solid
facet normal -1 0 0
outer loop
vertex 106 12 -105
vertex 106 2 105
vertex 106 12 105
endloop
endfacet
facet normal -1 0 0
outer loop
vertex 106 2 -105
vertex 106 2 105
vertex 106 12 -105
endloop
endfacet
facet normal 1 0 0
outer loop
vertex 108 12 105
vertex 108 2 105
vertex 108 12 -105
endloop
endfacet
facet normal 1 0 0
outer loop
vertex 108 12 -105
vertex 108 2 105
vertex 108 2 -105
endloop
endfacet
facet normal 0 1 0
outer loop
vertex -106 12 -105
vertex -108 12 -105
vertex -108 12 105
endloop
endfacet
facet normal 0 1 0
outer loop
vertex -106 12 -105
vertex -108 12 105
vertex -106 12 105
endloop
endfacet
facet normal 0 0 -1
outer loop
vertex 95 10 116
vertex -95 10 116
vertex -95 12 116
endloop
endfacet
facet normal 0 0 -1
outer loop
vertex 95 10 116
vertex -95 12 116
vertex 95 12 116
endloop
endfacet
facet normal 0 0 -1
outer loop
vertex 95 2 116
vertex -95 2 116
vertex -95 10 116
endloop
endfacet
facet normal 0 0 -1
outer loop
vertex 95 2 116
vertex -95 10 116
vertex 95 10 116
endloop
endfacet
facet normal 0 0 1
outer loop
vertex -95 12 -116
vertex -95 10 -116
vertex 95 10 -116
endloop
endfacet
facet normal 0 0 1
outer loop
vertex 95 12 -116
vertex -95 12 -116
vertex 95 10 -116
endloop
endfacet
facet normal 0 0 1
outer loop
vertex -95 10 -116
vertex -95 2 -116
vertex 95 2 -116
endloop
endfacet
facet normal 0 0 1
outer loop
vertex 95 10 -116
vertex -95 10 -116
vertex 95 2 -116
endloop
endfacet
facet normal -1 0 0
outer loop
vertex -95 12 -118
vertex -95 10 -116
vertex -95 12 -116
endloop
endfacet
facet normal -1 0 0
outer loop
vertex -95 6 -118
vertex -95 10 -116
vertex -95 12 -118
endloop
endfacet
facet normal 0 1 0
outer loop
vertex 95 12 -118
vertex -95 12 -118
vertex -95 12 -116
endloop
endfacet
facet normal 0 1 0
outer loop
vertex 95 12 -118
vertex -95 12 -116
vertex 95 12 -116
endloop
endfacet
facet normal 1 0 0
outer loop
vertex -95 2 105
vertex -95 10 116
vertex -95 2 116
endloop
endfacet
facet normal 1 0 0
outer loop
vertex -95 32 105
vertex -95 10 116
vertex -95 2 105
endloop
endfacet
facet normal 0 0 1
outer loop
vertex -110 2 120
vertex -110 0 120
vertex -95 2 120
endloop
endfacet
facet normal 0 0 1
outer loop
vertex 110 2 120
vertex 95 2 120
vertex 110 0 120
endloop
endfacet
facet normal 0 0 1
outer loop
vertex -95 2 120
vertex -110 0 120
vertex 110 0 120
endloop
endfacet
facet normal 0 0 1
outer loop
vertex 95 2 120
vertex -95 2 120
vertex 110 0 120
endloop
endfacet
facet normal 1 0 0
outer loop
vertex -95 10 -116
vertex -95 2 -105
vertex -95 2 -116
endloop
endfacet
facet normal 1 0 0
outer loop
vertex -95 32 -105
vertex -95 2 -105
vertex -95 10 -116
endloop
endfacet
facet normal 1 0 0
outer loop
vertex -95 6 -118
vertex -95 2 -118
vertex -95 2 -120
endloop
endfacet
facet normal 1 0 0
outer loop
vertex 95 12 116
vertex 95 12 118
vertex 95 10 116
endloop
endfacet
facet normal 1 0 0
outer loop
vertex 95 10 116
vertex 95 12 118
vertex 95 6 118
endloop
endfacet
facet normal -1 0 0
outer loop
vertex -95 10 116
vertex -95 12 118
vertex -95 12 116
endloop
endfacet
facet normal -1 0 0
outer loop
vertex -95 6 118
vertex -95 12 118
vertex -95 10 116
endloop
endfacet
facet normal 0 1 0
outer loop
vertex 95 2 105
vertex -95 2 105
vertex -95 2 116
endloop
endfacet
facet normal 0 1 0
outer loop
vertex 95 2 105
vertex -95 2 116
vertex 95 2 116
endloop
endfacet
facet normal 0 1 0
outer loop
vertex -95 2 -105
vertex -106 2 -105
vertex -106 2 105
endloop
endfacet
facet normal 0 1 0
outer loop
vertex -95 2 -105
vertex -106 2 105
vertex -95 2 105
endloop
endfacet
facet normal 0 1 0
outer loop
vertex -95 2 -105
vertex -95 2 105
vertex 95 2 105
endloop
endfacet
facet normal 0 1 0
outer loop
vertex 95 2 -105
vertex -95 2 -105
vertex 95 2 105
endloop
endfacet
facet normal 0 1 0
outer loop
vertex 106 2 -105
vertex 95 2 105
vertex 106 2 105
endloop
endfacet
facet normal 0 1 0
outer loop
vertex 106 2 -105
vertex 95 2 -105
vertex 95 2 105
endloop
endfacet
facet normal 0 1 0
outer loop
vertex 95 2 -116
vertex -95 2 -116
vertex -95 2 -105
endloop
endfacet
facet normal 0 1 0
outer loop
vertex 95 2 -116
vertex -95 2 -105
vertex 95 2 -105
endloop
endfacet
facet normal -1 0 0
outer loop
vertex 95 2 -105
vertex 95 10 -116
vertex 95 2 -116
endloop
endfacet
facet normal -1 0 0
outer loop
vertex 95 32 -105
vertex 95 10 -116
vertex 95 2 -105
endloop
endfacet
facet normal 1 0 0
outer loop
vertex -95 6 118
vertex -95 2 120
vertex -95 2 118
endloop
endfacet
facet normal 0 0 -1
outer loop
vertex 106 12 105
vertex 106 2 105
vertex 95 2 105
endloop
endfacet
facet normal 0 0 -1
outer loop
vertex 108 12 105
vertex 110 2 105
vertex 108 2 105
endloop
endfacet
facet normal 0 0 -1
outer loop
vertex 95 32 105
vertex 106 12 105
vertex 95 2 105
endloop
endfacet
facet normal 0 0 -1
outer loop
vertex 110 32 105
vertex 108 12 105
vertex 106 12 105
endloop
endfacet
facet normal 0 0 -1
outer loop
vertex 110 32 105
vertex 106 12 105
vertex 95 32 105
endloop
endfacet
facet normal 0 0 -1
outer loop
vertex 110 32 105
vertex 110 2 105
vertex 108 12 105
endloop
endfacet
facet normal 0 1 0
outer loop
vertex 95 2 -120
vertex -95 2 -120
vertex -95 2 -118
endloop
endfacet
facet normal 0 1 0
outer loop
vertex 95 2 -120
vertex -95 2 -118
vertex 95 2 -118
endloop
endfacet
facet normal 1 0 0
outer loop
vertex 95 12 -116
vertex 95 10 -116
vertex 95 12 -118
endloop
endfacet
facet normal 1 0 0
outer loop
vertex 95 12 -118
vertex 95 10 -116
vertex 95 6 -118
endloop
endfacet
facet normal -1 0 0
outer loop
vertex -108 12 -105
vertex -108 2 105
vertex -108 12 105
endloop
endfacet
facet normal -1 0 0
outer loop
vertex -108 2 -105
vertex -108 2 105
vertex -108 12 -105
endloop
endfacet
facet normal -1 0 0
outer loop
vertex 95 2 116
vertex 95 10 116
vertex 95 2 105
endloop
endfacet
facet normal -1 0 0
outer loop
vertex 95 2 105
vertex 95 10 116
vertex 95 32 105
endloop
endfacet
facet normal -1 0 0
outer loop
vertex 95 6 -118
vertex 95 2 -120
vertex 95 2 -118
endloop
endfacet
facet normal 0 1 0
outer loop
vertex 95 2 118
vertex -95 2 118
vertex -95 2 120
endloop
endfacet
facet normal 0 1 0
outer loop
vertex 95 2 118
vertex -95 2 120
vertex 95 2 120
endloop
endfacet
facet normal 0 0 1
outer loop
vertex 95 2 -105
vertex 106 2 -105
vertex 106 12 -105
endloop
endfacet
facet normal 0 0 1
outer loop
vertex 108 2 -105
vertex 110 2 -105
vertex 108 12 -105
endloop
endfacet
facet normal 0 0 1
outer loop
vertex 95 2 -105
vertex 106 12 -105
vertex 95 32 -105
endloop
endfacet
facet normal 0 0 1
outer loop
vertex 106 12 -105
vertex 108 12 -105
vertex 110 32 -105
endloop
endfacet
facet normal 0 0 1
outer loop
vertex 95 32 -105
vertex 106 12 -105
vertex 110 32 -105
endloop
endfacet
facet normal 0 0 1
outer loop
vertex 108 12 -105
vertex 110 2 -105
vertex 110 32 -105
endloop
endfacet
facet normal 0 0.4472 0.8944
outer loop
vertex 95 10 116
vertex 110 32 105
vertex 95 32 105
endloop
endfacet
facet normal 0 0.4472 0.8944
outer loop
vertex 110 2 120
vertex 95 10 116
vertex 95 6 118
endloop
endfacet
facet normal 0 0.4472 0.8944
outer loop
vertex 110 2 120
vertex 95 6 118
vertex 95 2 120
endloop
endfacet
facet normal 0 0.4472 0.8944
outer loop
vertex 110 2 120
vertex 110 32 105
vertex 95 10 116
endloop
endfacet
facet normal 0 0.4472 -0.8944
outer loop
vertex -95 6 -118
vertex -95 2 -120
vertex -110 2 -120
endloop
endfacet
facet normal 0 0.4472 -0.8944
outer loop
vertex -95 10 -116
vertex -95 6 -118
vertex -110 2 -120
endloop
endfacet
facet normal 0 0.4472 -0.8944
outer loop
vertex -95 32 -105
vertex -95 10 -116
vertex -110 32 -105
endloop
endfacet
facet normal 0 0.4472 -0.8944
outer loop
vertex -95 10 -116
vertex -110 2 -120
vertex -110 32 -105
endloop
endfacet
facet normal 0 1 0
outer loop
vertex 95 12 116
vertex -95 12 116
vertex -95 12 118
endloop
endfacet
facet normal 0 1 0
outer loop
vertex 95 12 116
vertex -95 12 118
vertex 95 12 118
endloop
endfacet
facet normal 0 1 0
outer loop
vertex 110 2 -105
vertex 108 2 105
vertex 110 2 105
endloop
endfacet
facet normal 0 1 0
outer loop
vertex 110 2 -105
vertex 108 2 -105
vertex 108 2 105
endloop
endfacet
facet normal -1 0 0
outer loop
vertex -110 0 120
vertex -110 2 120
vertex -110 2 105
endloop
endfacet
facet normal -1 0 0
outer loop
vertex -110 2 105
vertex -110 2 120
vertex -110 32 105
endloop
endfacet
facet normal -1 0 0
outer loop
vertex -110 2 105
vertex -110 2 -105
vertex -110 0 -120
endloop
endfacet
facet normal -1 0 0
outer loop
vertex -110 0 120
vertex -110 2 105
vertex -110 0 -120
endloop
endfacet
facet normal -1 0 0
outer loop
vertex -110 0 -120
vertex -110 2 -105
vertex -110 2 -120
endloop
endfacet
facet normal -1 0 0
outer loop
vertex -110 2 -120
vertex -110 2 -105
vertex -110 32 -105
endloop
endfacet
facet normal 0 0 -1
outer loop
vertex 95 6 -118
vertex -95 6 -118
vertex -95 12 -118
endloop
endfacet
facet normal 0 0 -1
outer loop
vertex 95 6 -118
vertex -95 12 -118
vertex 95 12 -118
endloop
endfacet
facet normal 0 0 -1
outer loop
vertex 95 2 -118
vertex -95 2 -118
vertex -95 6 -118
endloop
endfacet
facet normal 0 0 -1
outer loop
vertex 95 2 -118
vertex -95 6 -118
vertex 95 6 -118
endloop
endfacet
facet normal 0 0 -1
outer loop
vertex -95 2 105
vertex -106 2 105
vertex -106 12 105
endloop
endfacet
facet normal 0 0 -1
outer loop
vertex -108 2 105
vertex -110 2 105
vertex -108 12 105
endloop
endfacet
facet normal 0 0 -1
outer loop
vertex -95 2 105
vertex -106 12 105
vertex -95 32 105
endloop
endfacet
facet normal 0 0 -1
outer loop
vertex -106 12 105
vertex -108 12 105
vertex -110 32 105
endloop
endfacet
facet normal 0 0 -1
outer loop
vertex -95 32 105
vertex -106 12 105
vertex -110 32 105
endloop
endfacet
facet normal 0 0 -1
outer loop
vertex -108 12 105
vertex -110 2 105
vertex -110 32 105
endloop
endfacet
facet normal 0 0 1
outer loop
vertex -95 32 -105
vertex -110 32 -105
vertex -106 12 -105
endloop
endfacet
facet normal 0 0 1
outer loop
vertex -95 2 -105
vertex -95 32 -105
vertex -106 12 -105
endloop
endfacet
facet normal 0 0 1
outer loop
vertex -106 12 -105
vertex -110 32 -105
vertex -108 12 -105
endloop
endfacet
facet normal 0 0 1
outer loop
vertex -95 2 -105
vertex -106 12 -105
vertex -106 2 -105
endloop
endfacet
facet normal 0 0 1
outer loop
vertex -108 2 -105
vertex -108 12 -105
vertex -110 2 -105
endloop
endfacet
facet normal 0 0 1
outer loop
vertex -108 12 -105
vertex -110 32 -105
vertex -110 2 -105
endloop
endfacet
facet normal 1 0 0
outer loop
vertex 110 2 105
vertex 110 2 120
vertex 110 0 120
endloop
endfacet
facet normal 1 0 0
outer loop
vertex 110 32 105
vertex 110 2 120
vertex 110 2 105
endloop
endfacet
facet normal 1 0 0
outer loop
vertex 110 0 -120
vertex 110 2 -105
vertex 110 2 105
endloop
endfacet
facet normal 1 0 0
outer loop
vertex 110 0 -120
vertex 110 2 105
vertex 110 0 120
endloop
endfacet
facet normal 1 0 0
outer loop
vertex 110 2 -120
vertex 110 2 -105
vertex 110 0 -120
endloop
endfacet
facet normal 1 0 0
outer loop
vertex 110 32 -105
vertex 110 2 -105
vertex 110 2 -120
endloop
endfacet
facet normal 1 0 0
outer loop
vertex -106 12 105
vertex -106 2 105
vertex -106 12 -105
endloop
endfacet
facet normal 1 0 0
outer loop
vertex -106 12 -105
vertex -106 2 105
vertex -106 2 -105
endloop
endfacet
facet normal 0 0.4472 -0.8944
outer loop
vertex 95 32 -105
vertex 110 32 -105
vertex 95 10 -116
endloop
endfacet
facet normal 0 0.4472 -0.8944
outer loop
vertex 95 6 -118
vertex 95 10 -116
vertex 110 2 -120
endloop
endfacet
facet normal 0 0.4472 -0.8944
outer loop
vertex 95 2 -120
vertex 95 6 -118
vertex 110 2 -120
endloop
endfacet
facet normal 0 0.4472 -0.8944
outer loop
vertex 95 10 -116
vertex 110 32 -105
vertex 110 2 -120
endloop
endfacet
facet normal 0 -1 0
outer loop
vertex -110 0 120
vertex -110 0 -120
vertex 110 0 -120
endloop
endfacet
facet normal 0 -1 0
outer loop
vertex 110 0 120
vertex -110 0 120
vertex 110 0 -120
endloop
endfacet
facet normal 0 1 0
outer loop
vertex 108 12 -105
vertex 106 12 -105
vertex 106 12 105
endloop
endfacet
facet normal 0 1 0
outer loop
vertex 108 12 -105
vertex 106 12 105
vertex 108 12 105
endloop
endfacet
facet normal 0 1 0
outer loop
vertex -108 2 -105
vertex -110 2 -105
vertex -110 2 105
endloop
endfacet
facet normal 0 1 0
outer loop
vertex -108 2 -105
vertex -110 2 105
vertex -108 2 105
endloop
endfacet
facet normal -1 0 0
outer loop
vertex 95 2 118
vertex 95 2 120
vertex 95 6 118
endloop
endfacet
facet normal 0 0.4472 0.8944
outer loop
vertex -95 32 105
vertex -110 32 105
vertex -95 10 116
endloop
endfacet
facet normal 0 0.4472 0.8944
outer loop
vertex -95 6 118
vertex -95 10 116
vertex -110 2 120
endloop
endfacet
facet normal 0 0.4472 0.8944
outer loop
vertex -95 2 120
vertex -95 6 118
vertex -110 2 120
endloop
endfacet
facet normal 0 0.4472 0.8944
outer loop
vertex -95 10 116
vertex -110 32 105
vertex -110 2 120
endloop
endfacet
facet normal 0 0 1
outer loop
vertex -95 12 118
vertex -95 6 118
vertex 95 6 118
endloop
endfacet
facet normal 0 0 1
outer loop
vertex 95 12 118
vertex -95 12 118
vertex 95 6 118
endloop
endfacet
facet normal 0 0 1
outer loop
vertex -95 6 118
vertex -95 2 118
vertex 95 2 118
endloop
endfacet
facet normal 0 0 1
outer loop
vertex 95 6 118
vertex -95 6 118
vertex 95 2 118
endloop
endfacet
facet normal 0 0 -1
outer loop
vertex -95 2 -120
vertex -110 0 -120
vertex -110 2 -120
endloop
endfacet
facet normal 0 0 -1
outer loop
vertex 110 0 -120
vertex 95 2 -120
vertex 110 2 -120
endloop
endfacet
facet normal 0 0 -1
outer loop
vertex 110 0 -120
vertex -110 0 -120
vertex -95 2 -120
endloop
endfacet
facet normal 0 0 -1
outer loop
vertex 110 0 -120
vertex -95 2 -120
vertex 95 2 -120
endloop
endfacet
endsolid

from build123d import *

# Parameters (mm, degrees)
SKETCH2_W           = 220
SKETCH2_H           = 240
BOSS_EXTRUDE1_DEPTH = 2
SKETCH4_W           = 190
SKETCH4_H           = 2
SKETCH4_W_2         = 2
SKETCH4_H_2         = 210
BOSS_EXTRUDE3_DEPTH = 10
BOSS_EXTRUDE4_DEPTH = 15
BOSS_EXTRUDE5_DEPTH = 15


with BuildPart() as part:
    # Sketch2 → Boss-Extrude1 (new body)
    with BuildSketch(Plane(origin=(0, 0, 0), x_dir=(1, 0, 0), z_dir=(0, 1, 0))):
        Rectangle(SKETCH2_W, SKETCH2_H)
    extrude(amount=BOSS_EXTRUDE1_DEPTH)

    # Sketch4 → Boss-Extrude3 (add)
    with BuildSketch(Plane(origin=(0, 2, 0), x_dir=(1, 0, 0), z_dir=(0, 1, 0))):
        with Locations((0, 117)):
            Rectangle(SKETCH4_W, SKETCH4_H)
        with Locations((-107, 0)):
            Rectangle(SKETCH4_W_2, SKETCH4_H_2)
        with Locations((0, -117)):
            Rectangle(SKETCH4_W, SKETCH4_H)
        with Locations((107, 0)):
            Rectangle(SKETCH4_W_2, SKETCH4_H_2)
    extrude(amount=BOSS_EXTRUDE3_DEPTH)

    # Sketch5 → Boss-Extrude4 (add)
    with BuildSketch(Plane(origin=(110, 0, 0), x_dir=(0, 0, -1), z_dir=(1, 0, 0))):
        Polygon((-120, 2), (-105, 2), (-105, 32), align=None)
        Polygon((120, 2), (105, 2), (105, 32), align=None)
    extrude(amount=-BOSS_EXTRUDE4_DEPTH)

    # Sketch6 → Boss-Extrude5 (add)
    with BuildSketch(Plane.ZY.offset(110)):
        Polygon((120, 2), (105, 2), (105, 32), align=None)
        Polygon((-105, 32), (-105, 2), (-120, 2), align=None)
    extrude(amount=-BOSS_EXTRUDE5_DEPTH)


solid = part.part
